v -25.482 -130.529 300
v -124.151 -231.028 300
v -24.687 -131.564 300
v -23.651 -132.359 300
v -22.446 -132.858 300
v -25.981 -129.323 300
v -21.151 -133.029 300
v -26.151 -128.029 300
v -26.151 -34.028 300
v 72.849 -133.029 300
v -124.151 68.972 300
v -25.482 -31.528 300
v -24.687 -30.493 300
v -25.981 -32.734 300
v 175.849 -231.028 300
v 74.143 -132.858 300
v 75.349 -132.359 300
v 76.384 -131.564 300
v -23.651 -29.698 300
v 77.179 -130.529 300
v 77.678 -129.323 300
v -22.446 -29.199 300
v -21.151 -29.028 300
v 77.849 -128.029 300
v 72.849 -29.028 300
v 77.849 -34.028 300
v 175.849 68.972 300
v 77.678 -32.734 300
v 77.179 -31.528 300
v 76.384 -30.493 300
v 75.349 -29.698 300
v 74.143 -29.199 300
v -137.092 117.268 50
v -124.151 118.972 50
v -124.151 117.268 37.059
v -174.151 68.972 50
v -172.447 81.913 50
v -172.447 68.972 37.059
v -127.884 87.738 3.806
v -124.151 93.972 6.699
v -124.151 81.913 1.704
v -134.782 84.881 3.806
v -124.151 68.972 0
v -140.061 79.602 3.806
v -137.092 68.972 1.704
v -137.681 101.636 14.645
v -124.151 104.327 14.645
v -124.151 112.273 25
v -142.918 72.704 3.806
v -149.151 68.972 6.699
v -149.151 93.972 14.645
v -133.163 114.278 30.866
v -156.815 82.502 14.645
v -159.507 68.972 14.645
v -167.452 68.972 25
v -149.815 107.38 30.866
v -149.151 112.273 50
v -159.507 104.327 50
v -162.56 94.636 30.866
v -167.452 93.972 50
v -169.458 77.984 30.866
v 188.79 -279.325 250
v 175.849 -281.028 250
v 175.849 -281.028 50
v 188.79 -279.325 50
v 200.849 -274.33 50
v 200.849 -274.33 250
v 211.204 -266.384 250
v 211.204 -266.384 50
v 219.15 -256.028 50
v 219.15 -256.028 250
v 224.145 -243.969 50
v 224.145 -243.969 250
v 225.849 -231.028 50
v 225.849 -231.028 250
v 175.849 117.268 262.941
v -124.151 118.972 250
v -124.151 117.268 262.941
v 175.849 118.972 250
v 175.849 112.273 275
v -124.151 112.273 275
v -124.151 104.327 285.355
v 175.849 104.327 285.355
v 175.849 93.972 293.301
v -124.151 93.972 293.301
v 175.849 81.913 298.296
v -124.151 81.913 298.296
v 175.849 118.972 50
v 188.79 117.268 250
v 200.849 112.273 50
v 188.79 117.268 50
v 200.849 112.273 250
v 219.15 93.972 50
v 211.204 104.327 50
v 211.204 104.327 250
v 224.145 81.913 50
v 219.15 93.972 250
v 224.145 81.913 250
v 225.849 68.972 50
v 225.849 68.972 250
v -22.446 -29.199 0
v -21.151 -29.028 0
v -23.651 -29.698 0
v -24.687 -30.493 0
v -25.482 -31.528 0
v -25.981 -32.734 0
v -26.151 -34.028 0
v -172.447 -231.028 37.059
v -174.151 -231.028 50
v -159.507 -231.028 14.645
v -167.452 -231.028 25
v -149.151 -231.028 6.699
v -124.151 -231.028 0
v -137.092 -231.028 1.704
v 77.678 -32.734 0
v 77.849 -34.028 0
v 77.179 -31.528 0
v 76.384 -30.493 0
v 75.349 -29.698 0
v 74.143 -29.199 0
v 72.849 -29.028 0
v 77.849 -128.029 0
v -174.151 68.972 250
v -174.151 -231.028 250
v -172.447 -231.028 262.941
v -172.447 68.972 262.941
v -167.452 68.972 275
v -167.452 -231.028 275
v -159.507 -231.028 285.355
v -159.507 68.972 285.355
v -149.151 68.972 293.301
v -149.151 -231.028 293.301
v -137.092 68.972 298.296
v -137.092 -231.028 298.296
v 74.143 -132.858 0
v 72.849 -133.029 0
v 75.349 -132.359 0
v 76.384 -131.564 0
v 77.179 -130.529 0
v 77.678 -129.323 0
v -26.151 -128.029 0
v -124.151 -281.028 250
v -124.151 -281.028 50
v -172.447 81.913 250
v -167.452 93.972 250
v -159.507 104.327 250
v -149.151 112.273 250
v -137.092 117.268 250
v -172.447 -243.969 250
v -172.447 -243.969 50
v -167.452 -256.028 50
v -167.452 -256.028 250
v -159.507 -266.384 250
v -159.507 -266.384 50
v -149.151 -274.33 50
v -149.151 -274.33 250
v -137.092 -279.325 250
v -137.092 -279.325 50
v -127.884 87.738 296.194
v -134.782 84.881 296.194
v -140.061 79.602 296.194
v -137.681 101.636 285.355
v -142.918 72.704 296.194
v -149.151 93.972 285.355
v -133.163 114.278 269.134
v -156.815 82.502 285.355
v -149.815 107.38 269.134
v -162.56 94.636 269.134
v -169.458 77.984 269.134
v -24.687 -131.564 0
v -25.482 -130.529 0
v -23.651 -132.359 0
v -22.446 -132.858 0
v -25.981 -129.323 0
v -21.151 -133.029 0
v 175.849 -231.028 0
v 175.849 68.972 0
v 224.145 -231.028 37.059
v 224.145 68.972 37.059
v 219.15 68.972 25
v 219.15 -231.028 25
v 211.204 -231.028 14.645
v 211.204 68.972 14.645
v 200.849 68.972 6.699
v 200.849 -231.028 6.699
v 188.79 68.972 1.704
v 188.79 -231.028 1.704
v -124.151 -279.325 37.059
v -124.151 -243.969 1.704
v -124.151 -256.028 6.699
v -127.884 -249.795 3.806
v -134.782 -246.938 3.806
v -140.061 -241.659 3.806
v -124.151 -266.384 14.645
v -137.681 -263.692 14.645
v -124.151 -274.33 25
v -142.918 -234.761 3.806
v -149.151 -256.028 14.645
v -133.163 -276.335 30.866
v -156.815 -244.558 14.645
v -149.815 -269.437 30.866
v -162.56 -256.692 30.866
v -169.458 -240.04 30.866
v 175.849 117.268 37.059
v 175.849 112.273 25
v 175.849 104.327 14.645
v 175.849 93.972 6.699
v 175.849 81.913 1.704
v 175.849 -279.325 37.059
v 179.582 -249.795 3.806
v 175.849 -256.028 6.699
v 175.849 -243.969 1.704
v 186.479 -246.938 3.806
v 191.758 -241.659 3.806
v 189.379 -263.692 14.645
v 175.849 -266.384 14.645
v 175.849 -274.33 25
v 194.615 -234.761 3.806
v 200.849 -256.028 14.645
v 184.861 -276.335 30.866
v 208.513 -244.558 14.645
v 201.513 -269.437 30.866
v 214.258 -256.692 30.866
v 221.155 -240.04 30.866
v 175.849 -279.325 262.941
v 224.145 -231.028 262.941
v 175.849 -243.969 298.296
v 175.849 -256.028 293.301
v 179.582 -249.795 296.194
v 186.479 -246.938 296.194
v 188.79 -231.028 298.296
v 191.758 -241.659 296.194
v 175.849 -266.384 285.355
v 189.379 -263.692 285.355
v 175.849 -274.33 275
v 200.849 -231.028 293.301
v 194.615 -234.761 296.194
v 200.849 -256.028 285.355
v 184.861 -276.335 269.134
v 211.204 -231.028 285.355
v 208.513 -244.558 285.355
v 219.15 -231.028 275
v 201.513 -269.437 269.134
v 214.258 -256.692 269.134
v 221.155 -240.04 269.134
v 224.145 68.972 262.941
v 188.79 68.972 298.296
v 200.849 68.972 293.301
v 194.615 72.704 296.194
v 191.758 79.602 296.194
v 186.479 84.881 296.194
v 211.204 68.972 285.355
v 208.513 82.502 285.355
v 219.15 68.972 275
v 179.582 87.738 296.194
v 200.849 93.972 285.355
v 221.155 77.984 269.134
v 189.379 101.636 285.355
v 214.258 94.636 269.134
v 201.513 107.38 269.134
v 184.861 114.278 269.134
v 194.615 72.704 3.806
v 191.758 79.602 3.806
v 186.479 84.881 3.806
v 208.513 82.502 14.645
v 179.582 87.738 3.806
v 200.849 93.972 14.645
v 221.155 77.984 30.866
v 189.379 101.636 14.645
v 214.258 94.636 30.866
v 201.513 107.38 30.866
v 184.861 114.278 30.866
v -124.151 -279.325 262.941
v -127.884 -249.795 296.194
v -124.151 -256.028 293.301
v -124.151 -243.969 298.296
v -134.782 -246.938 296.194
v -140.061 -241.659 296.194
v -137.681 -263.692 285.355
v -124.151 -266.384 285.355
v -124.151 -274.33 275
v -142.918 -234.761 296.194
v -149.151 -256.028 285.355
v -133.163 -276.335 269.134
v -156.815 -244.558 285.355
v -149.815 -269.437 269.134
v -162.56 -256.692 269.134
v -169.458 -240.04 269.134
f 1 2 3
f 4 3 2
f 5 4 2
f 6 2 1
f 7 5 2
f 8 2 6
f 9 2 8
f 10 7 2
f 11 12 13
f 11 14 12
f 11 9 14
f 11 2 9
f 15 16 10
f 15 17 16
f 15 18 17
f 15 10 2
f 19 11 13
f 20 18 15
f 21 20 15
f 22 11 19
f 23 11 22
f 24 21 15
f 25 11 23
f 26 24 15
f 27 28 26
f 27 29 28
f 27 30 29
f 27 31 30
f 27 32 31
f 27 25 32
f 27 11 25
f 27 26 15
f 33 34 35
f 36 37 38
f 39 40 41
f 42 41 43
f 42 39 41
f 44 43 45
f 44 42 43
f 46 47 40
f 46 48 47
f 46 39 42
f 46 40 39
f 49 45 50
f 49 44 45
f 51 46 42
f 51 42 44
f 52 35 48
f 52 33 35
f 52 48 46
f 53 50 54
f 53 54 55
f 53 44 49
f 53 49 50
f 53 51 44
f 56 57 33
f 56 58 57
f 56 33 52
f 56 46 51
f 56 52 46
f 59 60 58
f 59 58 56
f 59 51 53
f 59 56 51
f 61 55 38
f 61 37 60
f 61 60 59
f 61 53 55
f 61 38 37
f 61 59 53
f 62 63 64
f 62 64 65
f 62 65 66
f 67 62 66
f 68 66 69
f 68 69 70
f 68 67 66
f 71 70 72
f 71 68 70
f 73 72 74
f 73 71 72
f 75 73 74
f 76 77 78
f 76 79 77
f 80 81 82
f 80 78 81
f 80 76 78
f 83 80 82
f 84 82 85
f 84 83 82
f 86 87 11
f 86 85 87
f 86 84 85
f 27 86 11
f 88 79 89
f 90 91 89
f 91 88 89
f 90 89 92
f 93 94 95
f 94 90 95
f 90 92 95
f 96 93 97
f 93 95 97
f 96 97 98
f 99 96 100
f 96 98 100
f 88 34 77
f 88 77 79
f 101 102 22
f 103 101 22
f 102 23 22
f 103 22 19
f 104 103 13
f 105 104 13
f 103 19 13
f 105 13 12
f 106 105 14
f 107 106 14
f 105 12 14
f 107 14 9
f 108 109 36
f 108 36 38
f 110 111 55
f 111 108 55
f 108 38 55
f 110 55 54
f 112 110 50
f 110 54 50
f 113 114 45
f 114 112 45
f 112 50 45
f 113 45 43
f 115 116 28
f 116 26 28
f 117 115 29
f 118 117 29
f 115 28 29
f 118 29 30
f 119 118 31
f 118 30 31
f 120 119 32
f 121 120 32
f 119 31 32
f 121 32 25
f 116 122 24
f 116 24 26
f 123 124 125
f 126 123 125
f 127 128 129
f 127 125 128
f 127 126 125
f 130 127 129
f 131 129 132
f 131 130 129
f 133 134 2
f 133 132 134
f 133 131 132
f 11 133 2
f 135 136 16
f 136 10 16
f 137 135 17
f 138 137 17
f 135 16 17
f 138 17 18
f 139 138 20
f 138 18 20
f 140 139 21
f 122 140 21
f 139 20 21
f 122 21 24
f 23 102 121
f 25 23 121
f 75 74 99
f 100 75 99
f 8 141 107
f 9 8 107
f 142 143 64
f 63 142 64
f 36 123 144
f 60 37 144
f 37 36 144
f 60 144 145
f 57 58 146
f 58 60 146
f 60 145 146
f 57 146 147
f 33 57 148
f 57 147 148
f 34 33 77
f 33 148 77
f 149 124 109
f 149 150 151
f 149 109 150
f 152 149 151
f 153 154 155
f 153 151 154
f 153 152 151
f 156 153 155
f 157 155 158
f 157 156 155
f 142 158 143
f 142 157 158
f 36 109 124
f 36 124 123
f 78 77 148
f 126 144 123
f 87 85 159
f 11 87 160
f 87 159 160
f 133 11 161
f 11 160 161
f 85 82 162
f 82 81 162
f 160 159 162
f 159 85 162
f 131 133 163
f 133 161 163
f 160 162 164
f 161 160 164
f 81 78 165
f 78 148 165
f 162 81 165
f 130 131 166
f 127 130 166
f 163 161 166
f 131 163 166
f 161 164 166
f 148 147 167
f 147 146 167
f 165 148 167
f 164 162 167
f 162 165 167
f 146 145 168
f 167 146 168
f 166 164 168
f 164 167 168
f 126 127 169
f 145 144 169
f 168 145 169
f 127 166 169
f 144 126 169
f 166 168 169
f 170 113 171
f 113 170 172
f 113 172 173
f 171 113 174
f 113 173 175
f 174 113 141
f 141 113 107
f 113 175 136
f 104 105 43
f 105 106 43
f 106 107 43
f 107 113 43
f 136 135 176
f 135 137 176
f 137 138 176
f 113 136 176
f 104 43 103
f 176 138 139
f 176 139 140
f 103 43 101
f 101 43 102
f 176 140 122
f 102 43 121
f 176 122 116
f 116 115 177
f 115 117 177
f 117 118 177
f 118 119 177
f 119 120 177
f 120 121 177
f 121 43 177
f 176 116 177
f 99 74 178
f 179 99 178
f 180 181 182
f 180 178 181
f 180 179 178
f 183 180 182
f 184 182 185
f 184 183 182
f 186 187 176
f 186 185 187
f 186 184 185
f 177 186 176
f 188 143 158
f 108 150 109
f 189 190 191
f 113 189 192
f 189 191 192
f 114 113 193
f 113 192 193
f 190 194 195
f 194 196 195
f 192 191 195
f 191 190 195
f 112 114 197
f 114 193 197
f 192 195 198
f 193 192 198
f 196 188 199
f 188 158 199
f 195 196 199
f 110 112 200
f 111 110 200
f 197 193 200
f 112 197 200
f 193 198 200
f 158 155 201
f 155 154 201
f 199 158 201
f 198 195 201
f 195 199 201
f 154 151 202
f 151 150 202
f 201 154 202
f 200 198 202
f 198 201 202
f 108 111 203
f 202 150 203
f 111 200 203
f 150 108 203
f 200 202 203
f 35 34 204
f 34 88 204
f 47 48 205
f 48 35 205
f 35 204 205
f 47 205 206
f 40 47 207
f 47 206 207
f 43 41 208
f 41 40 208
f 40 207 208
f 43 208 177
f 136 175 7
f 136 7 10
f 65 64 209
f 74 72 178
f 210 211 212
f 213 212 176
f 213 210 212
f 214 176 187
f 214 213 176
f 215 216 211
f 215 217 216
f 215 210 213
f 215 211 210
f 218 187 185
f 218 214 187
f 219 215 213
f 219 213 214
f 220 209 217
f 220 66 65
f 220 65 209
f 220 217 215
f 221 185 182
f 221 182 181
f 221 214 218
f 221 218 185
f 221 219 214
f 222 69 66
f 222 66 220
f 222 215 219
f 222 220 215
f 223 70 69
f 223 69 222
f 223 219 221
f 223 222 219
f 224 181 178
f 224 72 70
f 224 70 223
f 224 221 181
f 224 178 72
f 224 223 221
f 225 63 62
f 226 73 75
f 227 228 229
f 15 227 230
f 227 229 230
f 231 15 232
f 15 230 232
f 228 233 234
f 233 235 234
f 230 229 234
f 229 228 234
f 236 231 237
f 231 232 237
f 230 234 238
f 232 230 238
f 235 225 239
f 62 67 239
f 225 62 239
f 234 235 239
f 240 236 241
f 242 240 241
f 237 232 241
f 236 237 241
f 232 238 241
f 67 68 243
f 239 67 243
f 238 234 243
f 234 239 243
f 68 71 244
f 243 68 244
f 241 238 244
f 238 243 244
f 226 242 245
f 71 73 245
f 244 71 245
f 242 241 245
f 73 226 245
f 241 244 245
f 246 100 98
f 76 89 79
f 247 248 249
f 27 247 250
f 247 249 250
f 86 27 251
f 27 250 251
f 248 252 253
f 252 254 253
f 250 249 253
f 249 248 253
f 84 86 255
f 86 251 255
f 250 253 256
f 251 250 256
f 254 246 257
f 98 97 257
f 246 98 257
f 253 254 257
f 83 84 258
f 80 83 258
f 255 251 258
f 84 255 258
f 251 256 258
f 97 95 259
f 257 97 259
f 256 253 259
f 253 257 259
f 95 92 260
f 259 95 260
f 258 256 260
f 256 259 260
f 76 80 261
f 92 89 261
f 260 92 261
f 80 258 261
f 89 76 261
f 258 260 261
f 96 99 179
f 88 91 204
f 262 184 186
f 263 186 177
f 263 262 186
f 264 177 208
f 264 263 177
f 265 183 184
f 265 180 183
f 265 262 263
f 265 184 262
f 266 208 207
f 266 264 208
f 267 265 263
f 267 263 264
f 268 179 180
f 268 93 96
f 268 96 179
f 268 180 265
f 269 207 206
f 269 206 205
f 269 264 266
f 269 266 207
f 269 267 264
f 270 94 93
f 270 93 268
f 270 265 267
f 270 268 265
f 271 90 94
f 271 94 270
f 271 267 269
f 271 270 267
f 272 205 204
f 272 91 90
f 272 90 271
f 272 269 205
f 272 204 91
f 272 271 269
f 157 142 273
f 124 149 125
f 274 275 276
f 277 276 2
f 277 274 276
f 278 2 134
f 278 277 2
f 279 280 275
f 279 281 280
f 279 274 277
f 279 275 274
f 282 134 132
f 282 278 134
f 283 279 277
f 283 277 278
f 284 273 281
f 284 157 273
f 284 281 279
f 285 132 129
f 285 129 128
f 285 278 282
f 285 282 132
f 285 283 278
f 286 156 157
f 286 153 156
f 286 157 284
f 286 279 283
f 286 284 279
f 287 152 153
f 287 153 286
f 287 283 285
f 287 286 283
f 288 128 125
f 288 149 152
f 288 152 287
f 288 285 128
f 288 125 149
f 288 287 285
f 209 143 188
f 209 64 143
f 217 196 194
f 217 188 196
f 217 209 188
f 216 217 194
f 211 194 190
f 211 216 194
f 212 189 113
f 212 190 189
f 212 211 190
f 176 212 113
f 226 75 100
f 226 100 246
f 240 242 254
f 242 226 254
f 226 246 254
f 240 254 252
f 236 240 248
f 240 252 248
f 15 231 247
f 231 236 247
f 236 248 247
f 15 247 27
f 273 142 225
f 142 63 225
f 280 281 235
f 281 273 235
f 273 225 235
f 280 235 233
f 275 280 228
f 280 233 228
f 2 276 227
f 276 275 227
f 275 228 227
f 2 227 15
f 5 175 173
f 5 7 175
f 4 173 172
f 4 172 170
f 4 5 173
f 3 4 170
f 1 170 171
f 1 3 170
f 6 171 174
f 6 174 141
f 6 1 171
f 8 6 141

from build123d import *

# Parameters (mm, degrees)
F0_W     = 400
F0_H     = 400
F0_W_2   = 104.0003
F0_H_2   = 104.0003
F1_DEPTH = 300
F2_R     = 50
F3_R     = 5


with BuildPart() as f1:
    # F0 (on Top) → F1 (new body)
    with BuildSketch(Plane.XY):
        with Locations((25.848805, -81.028401)):
            Rectangle(F0_W, F0_H)
        with Locations((25.848655, -81.028551)):
            Rectangle(F0_W_2, F0_H_2, mode=Mode.SUBTRACT)
    extrude(amount=F1_DEPTH)

    # F2
    f2_edges = [f1.edges().sort_by_distance(p)[0] for p in [
        (-174.151195, -281.028401, 150),
        (225.848805, -281.028401, 150),
        (25.848805, -281.028401, 0),
        (25.848805, -281.028401, 300),
        (225.848805, 118.971599, 150),
        (225.848805, -81.028401, 0),
        (225.848805, -81.028401, 300),
        (-174.151195, 118.971599, 150),
        (25.848805, 118.971599, 0),
        (25.848805, 118.971599, 300),
        (-174.151195, -81.028401, 0),
        (-174.151195, -81.028401, 300),
    ]]
    fillet(f2_edges, radius=F2_R)

    # F3
    f3_edges = [f1.edges().sort_by_distance(p)[0] for p in [
        (-26.151495, -29.028401, 150),
        (77.848805, -29.028401, 150),
        (77.848805, -133.028701, 150),
        (-26.151495, -133.028701, 150),
    ]]
    fillet(f3_edges, radius=F3_R)


solid = f1.part
